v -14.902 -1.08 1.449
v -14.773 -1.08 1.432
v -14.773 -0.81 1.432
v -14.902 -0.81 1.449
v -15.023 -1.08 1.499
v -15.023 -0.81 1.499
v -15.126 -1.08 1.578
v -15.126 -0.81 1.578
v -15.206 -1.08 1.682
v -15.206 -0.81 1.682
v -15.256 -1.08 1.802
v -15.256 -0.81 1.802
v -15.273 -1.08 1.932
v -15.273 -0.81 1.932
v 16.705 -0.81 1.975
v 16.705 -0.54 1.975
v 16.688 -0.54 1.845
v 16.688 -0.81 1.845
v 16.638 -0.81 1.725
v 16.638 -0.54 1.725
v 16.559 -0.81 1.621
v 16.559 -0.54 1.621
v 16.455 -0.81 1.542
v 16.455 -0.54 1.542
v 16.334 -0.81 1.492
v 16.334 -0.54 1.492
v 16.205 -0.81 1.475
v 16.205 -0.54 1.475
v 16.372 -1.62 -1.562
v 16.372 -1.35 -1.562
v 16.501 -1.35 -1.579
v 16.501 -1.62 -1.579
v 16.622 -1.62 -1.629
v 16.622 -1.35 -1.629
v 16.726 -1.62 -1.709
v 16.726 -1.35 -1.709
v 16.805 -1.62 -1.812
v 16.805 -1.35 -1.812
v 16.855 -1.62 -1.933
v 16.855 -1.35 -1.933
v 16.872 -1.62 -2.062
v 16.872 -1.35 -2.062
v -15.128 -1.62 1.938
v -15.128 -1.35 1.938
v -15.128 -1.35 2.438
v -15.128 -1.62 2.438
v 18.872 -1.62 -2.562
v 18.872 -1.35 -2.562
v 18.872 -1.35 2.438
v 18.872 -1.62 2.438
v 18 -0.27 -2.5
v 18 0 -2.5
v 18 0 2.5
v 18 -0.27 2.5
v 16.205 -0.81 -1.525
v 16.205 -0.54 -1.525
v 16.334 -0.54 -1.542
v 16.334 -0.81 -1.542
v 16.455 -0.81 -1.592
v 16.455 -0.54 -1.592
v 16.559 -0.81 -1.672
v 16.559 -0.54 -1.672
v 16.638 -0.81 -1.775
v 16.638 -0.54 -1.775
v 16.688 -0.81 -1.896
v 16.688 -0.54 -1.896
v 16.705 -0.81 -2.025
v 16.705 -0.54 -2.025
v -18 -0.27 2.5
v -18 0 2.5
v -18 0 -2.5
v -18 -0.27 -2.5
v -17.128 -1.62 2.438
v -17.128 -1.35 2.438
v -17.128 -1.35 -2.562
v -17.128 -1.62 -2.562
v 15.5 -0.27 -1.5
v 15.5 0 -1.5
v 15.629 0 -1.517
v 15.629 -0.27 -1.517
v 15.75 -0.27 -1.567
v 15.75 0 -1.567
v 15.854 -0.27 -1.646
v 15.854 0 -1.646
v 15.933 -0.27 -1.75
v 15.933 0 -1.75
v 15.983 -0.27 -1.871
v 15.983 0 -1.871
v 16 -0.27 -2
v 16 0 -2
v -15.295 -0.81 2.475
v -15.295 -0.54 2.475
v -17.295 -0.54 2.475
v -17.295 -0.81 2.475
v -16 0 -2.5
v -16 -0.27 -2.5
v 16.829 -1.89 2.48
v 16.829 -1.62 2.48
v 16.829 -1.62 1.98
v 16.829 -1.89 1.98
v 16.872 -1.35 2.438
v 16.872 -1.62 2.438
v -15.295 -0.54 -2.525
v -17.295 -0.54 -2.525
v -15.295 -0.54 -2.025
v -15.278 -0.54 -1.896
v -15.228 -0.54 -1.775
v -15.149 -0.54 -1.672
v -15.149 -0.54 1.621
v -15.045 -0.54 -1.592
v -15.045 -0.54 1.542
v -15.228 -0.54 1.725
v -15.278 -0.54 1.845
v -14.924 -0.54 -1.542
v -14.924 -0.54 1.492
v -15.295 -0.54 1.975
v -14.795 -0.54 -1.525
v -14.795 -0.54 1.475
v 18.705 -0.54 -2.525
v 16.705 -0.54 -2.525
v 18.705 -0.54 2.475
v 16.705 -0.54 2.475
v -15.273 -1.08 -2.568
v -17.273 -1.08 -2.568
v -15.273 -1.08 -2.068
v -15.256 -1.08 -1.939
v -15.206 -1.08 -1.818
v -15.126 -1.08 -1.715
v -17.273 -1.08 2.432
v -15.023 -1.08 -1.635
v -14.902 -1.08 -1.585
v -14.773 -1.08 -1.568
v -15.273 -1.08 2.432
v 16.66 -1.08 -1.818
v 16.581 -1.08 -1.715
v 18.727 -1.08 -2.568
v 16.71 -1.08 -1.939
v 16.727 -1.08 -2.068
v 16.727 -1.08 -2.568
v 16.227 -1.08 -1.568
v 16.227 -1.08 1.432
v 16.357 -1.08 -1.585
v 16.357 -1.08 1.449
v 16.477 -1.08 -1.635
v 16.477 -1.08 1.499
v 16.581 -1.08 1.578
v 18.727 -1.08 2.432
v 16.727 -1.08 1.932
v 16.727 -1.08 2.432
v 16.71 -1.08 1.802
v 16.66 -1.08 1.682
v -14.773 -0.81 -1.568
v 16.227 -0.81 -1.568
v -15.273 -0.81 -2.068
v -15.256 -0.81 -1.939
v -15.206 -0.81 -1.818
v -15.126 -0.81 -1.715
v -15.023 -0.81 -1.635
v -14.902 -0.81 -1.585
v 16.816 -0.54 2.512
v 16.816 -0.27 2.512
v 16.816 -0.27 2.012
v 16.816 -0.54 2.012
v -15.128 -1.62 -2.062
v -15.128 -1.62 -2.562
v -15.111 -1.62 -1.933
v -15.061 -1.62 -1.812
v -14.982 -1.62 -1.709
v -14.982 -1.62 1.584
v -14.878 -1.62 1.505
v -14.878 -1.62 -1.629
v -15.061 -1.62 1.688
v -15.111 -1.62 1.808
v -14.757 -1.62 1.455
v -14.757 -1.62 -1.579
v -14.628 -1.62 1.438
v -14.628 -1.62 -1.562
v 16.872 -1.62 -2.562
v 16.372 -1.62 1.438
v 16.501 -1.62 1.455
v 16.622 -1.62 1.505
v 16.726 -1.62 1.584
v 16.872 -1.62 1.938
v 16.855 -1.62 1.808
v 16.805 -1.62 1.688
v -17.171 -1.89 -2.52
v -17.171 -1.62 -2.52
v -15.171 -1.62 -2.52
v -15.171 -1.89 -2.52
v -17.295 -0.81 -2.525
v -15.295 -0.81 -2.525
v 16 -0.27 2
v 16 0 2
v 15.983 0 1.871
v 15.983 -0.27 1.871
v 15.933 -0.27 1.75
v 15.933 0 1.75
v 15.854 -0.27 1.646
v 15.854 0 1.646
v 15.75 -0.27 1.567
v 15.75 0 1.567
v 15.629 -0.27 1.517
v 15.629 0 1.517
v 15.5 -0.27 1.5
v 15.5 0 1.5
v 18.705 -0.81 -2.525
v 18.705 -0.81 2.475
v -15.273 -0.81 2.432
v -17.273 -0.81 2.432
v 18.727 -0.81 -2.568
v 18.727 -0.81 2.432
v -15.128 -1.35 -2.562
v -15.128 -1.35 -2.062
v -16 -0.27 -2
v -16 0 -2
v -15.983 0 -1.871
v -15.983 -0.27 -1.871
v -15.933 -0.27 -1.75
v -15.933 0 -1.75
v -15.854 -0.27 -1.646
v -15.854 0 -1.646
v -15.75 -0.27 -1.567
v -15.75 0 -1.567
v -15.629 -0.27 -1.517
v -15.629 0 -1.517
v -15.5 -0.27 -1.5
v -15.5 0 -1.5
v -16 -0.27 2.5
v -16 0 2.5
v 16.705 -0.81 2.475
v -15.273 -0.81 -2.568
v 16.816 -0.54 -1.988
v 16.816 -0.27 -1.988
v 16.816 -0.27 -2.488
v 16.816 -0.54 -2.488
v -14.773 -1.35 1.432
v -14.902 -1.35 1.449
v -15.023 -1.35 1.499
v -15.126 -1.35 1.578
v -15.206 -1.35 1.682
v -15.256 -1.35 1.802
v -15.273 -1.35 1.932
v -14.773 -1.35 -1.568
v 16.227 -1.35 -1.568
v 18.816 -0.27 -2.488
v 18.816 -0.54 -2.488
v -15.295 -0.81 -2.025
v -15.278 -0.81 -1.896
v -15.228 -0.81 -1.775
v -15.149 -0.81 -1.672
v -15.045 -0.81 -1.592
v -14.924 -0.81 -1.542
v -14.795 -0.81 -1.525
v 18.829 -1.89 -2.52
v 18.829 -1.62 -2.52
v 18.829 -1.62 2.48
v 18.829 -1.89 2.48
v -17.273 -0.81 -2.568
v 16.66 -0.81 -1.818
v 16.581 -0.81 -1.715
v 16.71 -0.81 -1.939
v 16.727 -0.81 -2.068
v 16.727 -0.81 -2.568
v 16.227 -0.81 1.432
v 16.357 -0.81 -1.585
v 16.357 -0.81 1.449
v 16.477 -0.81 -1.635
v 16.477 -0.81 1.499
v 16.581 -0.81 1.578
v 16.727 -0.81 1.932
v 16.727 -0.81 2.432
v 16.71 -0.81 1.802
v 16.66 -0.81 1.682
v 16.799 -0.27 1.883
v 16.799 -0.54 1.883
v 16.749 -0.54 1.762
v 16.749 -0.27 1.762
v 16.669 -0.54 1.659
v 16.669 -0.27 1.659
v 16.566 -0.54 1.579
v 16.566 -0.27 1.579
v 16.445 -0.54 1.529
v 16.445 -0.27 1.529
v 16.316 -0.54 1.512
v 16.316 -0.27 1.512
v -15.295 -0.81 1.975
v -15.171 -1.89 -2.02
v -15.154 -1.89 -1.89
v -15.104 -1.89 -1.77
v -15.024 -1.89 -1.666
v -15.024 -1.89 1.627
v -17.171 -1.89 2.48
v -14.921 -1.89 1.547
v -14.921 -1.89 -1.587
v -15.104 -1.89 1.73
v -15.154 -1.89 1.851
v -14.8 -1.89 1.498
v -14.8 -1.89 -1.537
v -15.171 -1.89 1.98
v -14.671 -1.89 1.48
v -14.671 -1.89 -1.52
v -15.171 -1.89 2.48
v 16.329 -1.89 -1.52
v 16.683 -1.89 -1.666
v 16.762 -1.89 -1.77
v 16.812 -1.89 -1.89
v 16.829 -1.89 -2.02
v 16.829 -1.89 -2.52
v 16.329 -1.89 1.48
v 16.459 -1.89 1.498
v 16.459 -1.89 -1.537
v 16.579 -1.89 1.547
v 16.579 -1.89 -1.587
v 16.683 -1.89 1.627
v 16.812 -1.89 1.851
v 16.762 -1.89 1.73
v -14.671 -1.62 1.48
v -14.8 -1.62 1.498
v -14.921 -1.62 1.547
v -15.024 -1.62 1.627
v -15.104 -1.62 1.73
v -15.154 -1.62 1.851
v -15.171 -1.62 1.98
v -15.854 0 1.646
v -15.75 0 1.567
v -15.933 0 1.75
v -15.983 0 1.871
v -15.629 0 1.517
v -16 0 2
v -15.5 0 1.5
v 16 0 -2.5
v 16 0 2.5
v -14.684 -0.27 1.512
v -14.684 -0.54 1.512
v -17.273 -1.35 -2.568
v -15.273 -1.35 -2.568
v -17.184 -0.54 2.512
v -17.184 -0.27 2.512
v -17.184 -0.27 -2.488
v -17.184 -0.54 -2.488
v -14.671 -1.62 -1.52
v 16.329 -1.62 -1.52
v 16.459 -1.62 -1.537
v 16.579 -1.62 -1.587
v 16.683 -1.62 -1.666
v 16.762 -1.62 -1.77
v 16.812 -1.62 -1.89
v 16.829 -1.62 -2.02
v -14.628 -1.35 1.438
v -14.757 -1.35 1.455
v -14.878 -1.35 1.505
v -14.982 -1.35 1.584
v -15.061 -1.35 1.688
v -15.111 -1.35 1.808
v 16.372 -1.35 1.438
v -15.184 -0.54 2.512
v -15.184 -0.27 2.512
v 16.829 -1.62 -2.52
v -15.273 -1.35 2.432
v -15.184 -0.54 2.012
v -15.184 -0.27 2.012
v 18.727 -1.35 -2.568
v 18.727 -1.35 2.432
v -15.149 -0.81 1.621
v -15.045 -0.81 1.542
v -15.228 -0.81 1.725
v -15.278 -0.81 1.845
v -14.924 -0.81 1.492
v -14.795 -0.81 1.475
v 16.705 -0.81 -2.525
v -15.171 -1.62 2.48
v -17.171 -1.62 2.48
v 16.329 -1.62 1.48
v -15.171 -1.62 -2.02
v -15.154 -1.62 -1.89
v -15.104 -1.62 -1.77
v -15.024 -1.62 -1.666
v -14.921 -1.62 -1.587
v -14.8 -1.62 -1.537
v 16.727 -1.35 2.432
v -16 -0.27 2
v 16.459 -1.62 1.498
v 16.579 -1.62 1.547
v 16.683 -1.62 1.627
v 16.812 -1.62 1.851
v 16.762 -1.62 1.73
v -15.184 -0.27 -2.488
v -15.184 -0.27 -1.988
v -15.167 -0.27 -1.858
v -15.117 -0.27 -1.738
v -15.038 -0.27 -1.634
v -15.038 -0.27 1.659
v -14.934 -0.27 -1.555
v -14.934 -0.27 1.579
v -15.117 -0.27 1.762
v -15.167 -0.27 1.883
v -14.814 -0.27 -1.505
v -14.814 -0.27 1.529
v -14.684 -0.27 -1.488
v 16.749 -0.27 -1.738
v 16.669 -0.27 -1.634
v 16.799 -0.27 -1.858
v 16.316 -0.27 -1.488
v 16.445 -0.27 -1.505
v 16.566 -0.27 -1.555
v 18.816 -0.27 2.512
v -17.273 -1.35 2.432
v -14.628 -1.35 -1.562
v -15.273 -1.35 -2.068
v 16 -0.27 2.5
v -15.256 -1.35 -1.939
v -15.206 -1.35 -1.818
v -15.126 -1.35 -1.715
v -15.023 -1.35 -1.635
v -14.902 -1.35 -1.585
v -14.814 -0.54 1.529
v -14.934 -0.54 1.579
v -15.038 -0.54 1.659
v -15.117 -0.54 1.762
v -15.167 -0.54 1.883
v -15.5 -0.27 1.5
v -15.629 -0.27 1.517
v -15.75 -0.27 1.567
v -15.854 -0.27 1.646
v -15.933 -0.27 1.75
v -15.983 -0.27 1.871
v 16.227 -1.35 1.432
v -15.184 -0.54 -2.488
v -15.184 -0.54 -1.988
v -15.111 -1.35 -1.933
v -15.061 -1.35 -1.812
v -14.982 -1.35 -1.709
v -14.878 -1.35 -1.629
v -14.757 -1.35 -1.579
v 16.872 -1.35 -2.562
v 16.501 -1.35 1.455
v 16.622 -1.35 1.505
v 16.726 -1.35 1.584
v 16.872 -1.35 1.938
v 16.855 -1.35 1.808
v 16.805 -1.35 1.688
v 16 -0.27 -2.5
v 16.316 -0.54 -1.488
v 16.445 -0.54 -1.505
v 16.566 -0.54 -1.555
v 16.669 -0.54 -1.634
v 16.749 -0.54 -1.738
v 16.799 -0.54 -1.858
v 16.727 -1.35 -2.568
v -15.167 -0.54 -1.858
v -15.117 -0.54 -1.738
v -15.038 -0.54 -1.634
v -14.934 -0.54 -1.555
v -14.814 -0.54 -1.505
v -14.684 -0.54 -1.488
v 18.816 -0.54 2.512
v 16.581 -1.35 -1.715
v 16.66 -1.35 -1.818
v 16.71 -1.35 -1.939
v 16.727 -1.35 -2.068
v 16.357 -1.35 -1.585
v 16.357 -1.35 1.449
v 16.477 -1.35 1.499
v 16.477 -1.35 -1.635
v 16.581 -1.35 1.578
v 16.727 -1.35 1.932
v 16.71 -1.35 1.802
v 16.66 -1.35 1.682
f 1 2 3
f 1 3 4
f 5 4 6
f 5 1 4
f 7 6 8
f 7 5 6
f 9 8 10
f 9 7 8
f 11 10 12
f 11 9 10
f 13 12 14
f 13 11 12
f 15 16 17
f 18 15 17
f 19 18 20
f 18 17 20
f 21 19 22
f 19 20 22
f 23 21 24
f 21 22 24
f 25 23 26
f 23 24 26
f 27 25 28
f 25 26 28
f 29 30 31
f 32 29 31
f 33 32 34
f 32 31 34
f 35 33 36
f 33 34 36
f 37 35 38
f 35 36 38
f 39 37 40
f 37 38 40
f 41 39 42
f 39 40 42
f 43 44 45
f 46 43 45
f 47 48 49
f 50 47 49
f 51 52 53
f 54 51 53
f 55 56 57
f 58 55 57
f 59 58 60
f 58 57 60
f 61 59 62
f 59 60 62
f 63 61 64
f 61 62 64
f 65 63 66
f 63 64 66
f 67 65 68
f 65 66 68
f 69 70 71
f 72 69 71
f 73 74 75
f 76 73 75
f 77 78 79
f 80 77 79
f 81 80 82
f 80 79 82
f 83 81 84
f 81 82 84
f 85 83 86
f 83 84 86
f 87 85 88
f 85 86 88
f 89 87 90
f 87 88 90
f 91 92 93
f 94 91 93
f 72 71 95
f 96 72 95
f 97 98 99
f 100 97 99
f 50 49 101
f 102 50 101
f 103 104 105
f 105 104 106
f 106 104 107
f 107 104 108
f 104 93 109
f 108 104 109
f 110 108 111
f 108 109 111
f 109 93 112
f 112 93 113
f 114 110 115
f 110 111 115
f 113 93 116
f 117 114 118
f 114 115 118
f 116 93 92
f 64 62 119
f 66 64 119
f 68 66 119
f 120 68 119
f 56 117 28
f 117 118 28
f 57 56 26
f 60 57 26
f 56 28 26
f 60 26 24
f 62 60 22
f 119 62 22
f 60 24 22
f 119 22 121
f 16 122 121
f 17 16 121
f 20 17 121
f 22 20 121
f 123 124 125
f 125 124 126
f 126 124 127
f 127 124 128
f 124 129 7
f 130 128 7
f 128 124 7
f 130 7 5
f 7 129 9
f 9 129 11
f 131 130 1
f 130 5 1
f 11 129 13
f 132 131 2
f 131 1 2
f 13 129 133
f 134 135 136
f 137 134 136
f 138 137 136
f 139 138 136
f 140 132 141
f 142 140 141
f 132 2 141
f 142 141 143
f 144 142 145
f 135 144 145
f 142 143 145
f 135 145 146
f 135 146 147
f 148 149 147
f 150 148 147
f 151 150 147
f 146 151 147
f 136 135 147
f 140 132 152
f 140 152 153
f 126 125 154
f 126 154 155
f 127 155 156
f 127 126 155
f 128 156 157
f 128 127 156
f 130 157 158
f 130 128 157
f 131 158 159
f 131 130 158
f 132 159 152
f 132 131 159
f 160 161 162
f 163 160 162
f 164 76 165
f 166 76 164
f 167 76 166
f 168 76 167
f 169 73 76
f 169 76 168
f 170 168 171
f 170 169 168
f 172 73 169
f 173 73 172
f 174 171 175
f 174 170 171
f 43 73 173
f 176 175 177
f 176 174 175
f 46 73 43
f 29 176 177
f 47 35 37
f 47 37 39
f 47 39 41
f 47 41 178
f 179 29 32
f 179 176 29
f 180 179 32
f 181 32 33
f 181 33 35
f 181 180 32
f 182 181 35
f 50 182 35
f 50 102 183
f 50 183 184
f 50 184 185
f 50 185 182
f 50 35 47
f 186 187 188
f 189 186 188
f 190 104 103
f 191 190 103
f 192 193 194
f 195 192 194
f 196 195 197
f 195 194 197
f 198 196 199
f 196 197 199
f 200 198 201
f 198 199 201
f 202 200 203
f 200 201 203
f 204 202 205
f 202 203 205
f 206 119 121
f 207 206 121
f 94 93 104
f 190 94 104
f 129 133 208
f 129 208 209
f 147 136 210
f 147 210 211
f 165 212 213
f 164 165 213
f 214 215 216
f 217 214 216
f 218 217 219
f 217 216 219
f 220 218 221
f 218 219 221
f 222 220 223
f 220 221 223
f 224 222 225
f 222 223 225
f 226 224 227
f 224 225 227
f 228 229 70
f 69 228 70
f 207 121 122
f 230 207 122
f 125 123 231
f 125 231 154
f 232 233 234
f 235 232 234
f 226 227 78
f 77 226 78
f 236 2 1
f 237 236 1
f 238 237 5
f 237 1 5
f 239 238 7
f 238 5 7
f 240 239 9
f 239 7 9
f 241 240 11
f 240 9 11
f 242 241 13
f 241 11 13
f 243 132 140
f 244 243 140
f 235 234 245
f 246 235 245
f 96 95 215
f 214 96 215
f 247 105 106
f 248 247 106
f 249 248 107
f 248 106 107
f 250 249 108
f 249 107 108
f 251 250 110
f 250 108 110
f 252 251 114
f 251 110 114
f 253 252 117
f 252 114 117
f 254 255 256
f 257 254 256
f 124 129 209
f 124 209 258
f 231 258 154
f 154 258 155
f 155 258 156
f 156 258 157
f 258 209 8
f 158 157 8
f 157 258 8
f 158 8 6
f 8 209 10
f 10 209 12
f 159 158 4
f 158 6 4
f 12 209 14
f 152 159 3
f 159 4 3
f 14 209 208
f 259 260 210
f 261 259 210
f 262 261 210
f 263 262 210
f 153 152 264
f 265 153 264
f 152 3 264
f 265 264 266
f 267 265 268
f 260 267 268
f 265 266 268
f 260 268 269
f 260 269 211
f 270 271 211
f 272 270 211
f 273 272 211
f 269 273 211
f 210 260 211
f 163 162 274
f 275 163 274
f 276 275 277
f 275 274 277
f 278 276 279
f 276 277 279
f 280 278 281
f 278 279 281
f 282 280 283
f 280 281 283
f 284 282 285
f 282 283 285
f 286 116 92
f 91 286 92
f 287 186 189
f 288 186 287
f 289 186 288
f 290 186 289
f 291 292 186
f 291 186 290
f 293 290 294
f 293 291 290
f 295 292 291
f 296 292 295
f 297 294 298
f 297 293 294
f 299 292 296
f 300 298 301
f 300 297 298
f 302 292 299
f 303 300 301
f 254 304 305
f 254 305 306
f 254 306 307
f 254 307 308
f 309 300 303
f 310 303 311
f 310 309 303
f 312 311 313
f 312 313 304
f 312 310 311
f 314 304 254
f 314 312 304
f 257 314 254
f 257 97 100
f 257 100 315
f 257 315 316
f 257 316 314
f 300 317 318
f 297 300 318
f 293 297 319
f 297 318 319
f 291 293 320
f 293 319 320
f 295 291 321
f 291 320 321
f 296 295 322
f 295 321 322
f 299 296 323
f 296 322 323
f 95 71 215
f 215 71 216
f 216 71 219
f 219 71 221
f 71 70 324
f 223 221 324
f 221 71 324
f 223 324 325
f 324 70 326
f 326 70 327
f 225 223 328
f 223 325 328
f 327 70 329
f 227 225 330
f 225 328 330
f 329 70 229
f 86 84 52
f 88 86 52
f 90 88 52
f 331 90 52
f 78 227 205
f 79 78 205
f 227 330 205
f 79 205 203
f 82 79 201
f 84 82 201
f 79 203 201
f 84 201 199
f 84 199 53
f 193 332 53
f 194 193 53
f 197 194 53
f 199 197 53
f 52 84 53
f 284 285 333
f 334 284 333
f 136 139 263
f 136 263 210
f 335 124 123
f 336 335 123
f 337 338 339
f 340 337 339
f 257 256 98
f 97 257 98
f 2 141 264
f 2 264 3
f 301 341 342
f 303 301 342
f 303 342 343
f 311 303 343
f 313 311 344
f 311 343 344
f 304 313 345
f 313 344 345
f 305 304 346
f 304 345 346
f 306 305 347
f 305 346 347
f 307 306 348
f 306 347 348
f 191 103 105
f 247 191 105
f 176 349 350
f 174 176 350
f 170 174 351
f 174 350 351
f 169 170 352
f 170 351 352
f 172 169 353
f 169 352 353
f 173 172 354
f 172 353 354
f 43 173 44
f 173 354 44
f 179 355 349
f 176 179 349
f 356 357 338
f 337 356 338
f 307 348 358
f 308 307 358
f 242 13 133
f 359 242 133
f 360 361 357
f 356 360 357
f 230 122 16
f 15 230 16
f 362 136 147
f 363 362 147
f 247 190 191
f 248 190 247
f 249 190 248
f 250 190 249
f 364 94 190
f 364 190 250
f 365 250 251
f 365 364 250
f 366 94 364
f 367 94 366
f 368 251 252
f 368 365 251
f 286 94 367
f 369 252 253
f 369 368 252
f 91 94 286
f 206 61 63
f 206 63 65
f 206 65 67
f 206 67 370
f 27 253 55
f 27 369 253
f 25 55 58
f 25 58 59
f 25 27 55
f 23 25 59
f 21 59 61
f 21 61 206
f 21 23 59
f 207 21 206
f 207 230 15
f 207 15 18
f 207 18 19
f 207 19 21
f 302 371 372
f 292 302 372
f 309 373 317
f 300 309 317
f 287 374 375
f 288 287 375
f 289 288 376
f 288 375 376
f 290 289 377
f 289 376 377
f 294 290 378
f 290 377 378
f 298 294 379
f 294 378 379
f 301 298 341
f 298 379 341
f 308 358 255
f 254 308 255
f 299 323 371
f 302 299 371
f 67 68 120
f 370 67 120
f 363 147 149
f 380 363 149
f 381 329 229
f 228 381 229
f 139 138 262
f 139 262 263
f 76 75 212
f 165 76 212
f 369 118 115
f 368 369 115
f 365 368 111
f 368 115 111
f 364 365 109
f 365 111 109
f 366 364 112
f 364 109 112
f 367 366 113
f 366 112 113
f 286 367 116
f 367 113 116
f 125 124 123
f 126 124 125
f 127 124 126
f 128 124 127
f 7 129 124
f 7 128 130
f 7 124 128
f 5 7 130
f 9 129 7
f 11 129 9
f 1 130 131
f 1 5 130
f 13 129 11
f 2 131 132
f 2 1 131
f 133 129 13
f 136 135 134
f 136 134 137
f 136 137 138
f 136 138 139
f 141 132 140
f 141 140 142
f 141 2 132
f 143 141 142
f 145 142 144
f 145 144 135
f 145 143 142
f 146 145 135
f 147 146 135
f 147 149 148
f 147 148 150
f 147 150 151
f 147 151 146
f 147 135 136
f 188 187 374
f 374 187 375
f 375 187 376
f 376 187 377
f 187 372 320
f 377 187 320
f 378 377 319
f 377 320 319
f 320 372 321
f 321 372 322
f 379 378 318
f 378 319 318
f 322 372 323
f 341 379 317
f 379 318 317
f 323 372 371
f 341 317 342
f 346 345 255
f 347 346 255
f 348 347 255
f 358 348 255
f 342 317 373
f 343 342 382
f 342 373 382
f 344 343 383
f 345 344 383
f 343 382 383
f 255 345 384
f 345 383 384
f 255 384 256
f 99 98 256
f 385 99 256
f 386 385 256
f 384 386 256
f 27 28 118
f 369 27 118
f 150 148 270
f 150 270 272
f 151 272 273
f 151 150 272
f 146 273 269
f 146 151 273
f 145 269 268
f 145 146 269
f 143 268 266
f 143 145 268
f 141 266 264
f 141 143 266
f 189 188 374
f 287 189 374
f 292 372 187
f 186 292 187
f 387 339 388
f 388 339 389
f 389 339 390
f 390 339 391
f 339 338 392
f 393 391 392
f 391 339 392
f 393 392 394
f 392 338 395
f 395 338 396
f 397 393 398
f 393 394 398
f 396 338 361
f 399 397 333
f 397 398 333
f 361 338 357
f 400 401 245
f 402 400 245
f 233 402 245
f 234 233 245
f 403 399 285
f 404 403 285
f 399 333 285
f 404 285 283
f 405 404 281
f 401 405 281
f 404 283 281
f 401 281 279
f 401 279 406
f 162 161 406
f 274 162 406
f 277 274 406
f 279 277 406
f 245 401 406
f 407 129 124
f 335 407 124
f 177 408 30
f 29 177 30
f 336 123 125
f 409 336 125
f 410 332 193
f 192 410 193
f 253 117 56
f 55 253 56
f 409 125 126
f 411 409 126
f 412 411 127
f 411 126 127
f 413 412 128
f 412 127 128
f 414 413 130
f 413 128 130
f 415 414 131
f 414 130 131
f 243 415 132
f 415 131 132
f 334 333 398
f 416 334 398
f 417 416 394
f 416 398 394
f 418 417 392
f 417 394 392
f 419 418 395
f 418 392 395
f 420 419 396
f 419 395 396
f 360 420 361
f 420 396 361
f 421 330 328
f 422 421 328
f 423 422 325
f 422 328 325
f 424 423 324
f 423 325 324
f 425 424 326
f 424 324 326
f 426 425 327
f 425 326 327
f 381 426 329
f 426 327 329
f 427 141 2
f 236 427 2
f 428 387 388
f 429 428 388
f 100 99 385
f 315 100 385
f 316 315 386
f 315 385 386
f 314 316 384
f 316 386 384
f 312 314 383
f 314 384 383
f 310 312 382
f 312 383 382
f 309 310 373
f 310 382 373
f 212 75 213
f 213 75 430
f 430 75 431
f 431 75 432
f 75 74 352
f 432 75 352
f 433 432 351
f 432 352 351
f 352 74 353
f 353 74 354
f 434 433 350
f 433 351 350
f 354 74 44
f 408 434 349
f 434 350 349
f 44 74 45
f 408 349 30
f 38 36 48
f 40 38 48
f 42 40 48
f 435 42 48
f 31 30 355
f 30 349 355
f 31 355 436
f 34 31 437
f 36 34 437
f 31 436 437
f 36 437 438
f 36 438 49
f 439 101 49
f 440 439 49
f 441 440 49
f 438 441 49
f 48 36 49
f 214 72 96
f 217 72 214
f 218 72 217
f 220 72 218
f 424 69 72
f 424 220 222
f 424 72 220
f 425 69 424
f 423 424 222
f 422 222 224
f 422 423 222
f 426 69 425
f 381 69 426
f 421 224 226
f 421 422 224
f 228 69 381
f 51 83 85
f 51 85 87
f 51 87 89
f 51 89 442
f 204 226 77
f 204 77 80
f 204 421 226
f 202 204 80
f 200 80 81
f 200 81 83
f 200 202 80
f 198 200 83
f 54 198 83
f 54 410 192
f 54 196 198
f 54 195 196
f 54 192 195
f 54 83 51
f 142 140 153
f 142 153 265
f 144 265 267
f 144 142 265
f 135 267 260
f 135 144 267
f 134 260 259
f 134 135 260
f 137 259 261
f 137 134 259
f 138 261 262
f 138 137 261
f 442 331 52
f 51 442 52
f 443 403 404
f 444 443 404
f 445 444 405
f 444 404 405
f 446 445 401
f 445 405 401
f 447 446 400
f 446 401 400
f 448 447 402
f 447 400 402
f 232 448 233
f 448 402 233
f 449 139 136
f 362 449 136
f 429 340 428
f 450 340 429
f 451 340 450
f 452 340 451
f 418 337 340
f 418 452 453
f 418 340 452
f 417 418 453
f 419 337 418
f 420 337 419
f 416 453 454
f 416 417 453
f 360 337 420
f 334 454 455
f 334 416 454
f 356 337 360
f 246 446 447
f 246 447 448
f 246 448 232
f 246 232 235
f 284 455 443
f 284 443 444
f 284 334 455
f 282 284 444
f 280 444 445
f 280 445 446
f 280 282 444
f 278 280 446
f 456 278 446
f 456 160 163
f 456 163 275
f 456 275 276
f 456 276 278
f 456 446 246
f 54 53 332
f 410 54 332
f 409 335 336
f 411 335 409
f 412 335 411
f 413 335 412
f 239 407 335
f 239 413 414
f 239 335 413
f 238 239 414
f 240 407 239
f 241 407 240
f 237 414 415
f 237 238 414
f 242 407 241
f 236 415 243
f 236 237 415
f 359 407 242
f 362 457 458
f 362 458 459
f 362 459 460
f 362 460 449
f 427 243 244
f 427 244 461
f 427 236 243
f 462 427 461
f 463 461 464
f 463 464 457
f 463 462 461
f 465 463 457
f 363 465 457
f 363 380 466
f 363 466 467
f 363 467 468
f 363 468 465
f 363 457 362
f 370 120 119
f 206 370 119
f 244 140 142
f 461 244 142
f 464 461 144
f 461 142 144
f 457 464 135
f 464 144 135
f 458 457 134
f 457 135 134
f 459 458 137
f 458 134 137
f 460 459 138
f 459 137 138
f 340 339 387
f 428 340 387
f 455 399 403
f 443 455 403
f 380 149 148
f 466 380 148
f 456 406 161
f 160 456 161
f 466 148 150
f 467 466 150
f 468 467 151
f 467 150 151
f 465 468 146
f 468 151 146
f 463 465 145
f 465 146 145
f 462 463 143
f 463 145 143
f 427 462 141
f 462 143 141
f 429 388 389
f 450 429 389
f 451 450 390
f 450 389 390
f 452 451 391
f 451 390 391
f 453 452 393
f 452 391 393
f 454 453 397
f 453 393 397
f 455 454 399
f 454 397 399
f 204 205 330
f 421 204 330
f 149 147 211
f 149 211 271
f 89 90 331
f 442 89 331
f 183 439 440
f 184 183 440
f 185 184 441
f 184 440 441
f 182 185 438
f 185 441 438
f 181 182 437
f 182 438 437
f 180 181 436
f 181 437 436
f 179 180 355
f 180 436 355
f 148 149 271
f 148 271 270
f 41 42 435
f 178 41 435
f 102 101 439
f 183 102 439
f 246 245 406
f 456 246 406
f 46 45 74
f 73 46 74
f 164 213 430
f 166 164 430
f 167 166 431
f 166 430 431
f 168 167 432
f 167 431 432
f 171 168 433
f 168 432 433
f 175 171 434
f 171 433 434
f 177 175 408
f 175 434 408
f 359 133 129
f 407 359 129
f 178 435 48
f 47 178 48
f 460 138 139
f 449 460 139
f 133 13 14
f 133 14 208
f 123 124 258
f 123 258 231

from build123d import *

# Parameters (mm, degrees)
F1_DEPTH  = 0.27
F4_DEPTH  = 0.27
F7_DEPTH  = 0.27
F10_DEPTH = 0.27
F13_DEPTH = 0.27
F14_DEPTH = 0.27
F15_DEPTH = 0.27
F18_DEPTH = 0.27
F21_DEPTH = 0.27


with BuildPart() as f1:
    # F0 (on Front) → F1 (new body)
    with BuildSketch(Plane.XZ):
        with BuildLine():
            Line((-16, 2.5), (-18, 2.5))
            Line((-18, 2.5), (-18, 0))
            Line((-18, 0), (18, 0))
            Line((18, 0), (18, 2.5))
            Line((18, 2.5), (16, 2.5))
            Line((16, 2.5), (16, 2))
            ThreePointArc((16, 2), (15.8535533906, 1.6464466094), (15.5, 1.5))
            Line((15.5, 1.5), (0, 1.5))
            Line((0, 1.5), (-15.5, 1.5))
            ThreePointArc((-15.5, 1.5), (-15.8535533906, 1.6464466094), (-16, 2))
            Line((-16, 2), (-16, 2.5))
        make_face()
        with BuildLine():
            Line((18, 0), (-18, 0))
            Line((-18, 0), (-18, -2.5))
            Line((-18, -2.5), (-16, -2.5))
            Line((-16, -2.5), (-16, -2))
            ThreePointArc((-16, -2), (-15.8535533906, -1.6464466094), (-15.5, -1.5))
            Line((-15.5, -1.5), (0, -1.5))
            Line((0, -1.5), (15.5, -1.5))
            ThreePointArc((15.5, -1.5), (15.8535533906, -1.6464466094), (16, -2))
            Line((16, -2), (16, -2.5))
            Line((16, -2.5), (18, -2.5))
            Line((18, -2.5), (18, 0))
        make_face()
    extrude(amount=F1_DEPTH)

    # F3 (on offset) → F4 (cut)
    with BuildSketch(Plane.XZ.offset(0.27)):
        with BuildLine():
            Line((-15.1841846166, 2.5122108632), (-17.1841846166, 2.5122108632))
            Line((-17.1841846166, 2.5122108632), (-17.1841846166, 0.0122108632))
            Line((-17.1841846166, 0.0122108632), (18.8158153834, 0.0122108632))
            Line((18.8158153834, 0.0122108632), (18.8158153834, 2.5122108632))
            Line((18.8158153834, 2.5122108632), (16.8158153834, 2.5122108632))
            Line((16.8158153834, 2.5122108632), (16.8158153834, 2.0122108632))
            ThreePointArc((16.8158153834, 2.0122108632), (16.669368774, 1.6586574726), (16.3158153834, 1.5122108632))
            Line((16.3158153834, 1.5122108632), (0.8158153834, 1.5122108632))
            Line((0.8158153834, 1.5122108632), (-14.6841846166, 1.5122108632))
            ThreePointArc((-14.6841846166, 1.5122108632), (-15.0377380072, 1.6586574726), (-15.1841846166, 2.0122108632))
            Line((-15.1841846166, 2.0122108632), (-15.1841846166, 2.5122108632))
        make_face()
        with BuildLine():
            Line((18.8158153834, 0.0122108632), (-17.1841846166, 0.0122108632))
            Line((-17.1841846166, 0.0122108632), (-17.1841846166, -2.4877891368))
            Line((-17.1841846166, -2.4877891368), (-15.1841846166, -2.4877891368))
            Line((-15.1841846166, -2.4877891368), (-15.1841846166, -1.9877891368))
            ThreePointArc((-15.1841846166, -1.9877891368), (-15.0377380072, -1.6342357462), (-14.6841846166, -1.4877891368))
            Line((-14.6841846166, -1.4877891368), (0.8158153834, -1.4877891368))
            Line((0.8158153834, -1.4877891368), (16.3158153834, -1.4877891368))
            ThreePointArc((16.3158153834, -1.4877891368), (16.669368774, -1.6342357462), (16.8158153834, -1.9877891368))
            Line((16.8158153834, -1.9877891368), (16.8158153834, -2.4877891368))
            Line((16.8158153834, -2.4877891368), (18.8158153834, -2.4877891368))
            Line((18.8158153834, -2.4877891368), (18.8158153834, 0.0122108632))
        make_face()
    extrude(amount=F4_DEPTH, mode=Mode.SUBTRACT)

    # F9 (on offset) → F10 (cut)
    with BuildSketch(Plane.XZ.offset(0.81)):
        with BuildLine():
            Line((-15.2458471914, 2.4499582283), (-17.2458471914, 2.4499582283))
            Line((-17.2458471914, 2.4499582283), (-17.2458471914, -0.0500417717))
            Line((-17.2458471914, -0.0500417717), (18.7541528086, -0.0500417717))
            Line((18.7541528086, -0.0500417717), (18.7541528086, 2.4499582283))
            Line((18.7541528086, 2.4499582283), (16.7541528086, 2.4499582283))
            Line((16.7541528086, 2.4499582283), (16.7541528086, 1.9499582283))
            ThreePointArc((16.7541528086, 1.9499582283), (16.6077061992, 1.5964048377), (16.2541528086, 1.4499582283))
            Line((16.2541528086, 1.4499582283), (0.7541528086, 1.4499582283))
            Line((0.7541528086, 1.4499582283), (-14.7458471914, 1.4499582283))
            ThreePointArc((-14.7458471914, 1.4499582283), (-15.099400582, 1.5964048377), (-15.2458471914, 1.9499582283))
            Line((-15.2458471914, 1.9499582283), (-15.2458471914, 2.4499582283))
        make_face()
        with BuildLine():
            Line((18.7541528086, -0.0500417717), (-17.2458471914, -0.0500417717))
            Line((-17.2458471914, -0.0500417717), (-17.2458471914, -2.5500417717))
            Line((-17.2458471914, -2.5500417717), (-15.2458471914, -2.5500417717))
            Line((-15.2458471914, -2.5500417717), (-15.2458471914, -2.0500417717))
            ThreePointArc((-15.2458471914, -2.0500417717), (-15.099400582, -1.6964883811), (-14.7458471914, -1.5500417717))
            Line((-14.7458471914, -1.5500417717), (0.7541528086, -1.5500417717))
            Line((0.7541528086, -1.5500417717), (16.2541528086, -1.5500417717))
            ThreePointArc((16.2541528086, -1.5500417717), (16.6077061992, -1.6964883811), (16.7541528086, -2.0500417717))
            Line((16.7541528086, -2.0500417717), (16.7541528086, -2.5500417717))
            Line((16.7541528086, -2.5500417717), (18.7541528086, -2.5500417717))
            Line((18.7541528086, -2.5500417717), (18.7541528086, -0.0500417717))
        make_face()
    extrude(amount=F10_DEPTH, mode=Mode.SUBTRACT)


with BuildPart() as f7:
    # F6 (on offset) → F7 (new body)
    with BuildSketch(Plane.XZ.offset(0.54)):
        with BuildLine():
            Line((-15.2949587338, 2.4747978128), (-17.2949587338, 2.4747978128))
            Line((-17.2949587338, 2.4747978128), (-17.2949587338, -0.0252021872))
            Line((-17.2949587338, -0.0252021872), (18.7050412662, -0.0252021872))
            Line((18.7050412662, -0.0252021872), (18.7050412662, 2.4747978128))
            Line((18.7050412662, 2.4747978128), (16.7050412662, 2.4747978128))
            Line((16.7050412662, 2.4747978128), (16.7050412662, 1.9747978128))
            ThreePointArc((16.7050412662, 1.9747978128), (16.5585946567, 1.6212444222), (16.2050412662, 1.4747978128))
            Line((16.2050412662, 1.4747978128), (0.7050412662, 1.4747978128))
            Line((0.7050412662, 1.4747978128), (-14.7949587338, 1.4747978128))
            ThreePointArc((-14.7949587338, 1.4747978128), (-15.1485121244, 1.6212444222), (-15.2949587338, 1.9747978128))
            Line((-15.2949587338, 1.9747978128), (-15.2949587338, 2.4747978128))
        make_face()
        with BuildLine():
            Line((18.7050412662, -0.0252021872), (-17.2949587338, -0.0252021872))
            Line((-17.2949587338, -0.0252021872), (-17.2949587338, -2.5252021872))
            Line((-17.2949587338, -2.5252021872), (-15.2949587338, -2.5252021872))
            Line((-15.2949587338, -2.5252021872), (-15.2949587338, -2.0252021872))
            ThreePointArc((-15.2949587338, -2.0252021872), (-15.1485121244, -1.6716487966), (-14.7949587338, -1.5252021872))
            Line((-14.7949587338, -1.5252021872), (0.7050412662, -1.5252021872))
            Line((0.7050412662, -1.5252021872), (16.2050412662, -1.5252021872))
            ThreePointArc((16.2050412662, -1.5252021872), (16.5585946567, -1.6716487966), (16.7050412662, -2.0252021872))
            Line((16.7050412662, -2.0252021872), (16.7050412662, -2.5252021872))
            Line((16.7050412662, -2.5252021872), (18.7050412662, -2.5252021872))
            Line((18.7050412662, -2.5252021872), (18.7050412662, -0.0252021872))
        make_face()
    extrude(amount=F7_DEPTH)


with BuildPart() as f13:
    # F12 (on offset) → F13 (new body)
    with BuildSketch(Plane.XZ.offset(1.08)):
        with BuildLine():
            Line((-15.2727272727, 2.4318181818), (-17.2727272727, 2.4318181818))
            Line((-17.2727272727, 2.4318181818), (-17.2727272727, -0.0681818182))
            Line((-17.2727272727, -0.0681818182), (18.7272727273, -0.0681818182))
            Line((18.7272727273, -0.0681818182), (18.7272727273, 2.4318181818))
            Line((18.7272727273, 2.4318181818), (16.7272727273, 2.4318181818))
            Line((16.7272727273, 2.4318181818), (16.7272727273, 1.9318181818))
            ThreePointArc((16.7272727273, 1.9318181818), (16.5808261179, 1.5782647912), (16.2272727273, 1.4318181818))
            Line((16.2272727273, 1.4318181818), (0.7272727273, 1.4318181818))
            Line((0.7272727273, 1.4318181818), (-14.7727272727, 1.4318181818))
            ThreePointArc((-14.7727272727, 1.4318181818), (-15.1262806633, 1.5782647912), (-15.2727272727, 1.9318181818))
            Line((-15.2727272727, 1.9318181818), (-15.2727272727, 2.4318181818))
        make_face()
        with BuildLine():
            Line((18.7272727273, -0.0681818182), (-17.2727272727, -0.0681818182))
            Line((-17.2727272727, -0.0681818182), (-17.2727272727, -2.5681818182))
            Line((-17.2727272727, -2.5681818182), (-15.2727272727, -2.5681818182))
            Line((-15.2727272727, -2.5681818182), (-15.2727272727, -2.0681818182))
            ThreePointArc((-15.2727272727, -2.0681818182), (-15.1262806633, -1.7146284276), (-14.7727272727, -1.5681818182))
            Line((-14.7727272727, -1.5681818182), (0.7272727273, -1.5681818182))
            Line((0.7272727273, -1.5681818182), (16.2272727273, -1.5681818182))
            ThreePointArc((16.2272727273, -1.5681818182), (16.5808261179, -1.7146284276), (16.7272727273, -2.0681818182))
            Line((16.7272727273, -2.0681818182), (16.7272727273, -2.5681818182))
            Line((16.7272727273, -2.5681818182), (18.7272727273, -2.5681818182))
            Line((18.7272727273, -2.5681818182), (18.7272727273, -0.0681818182))
        make_face()
    extrude(amount=F13_DEPTH)


with BuildPart() as f14:
    # F3 (on offset) → F14 (new body)
    with BuildSketch(Plane.XZ.offset(0.27)):
        with BuildLine():
            Line((-15.1841846166, 2.5122108632), (-17.1841846166, 2.5122108632))
            Line((-17.1841846166, 2.5122108632), (-17.1841846166, 0.0122108632))
            Line((-17.1841846166, 0.0122108632), (18.8158153834, 0.0122108632))
            Line((18.8158153834, 0.0122108632), (18.8158153834, 2.5122108632))
            Line((18.8158153834, 2.5122108632), (16.8158153834, 2.5122108632))
            Line((16.8158153834, 2.5122108632), (16.8158153834, 2.0122108632))
            ThreePointArc((16.8158153834, 2.0122108632), (16.669368774, 1.6586574726), (16.3158153834, 1.5122108632))
            Line((16.3158153834, 1.5122108632), (0.8158153834, 1.5122108632))
            Line((0.8158153834, 1.5122108632), (-14.6841846166, 1.5122108632))
            ThreePointArc((-14.6841846166, 1.5122108632), (-15.0377380072, 1.6586574726), (-15.1841846166, 2.0122108632))
            Line((-15.1841846166, 2.0122108632), (-15.1841846166, 2.5122108632))
        make_face()
        with BuildLine():
            Line((18.8158153834, 0.0122108632), (-17.1841846166, 0.0122108632))
            Line((-17.1841846166, 0.0122108632), (-17.1841846166, -2.4877891368))
            Line((-17.1841846166, -2.4877891368), (-15.1841846166, -2.4877891368))
            Line((-15.1841846166, -2.4877891368), (-15.1841846166, -1.9877891368))
            ThreePointArc((-15.1841846166, -1.9877891368), (-15.0377380072, -1.6342357462), (-14.6841846166, -1.4877891368))
            Line((-14.6841846166, -1.4877891368), (0.8158153834, -1.4877891368))
            Line((0.8158153834, -1.4877891368), (16.3158153834, -1.4877891368))
            ThreePointArc((16.3158153834, -1.4877891368), (16.669368774, -1.6342357462), (16.8158153834, -1.9877891368))
            Line((16.8158153834, -1.9877891368), (16.8158153834, -2.4877891368))
            Line((16.8158153834, -2.4877891368), (18.8158153834, -2.4877891368))
            Line((18.8158153834, -2.4877891368), (18.8158153834, 0.0122108632))
        make_face()
    extrude(amount=F14_DEPTH)


with BuildPart() as f15:
    # F12 (on offset) → F15 (new body)
    with BuildSketch(Plane.XZ.offset(1.08)):
        with BuildLine():
            Line((-15.2727272727, 2.4318181818), (-17.2727272727, 2.4318181818))
            Line((-17.2727272727, 2.4318181818), (-17.2727272727, -0.0681818182))
            Line((-17.2727272727, -0.0681818182), (18.7272727273, -0.0681818182))
            Line((18.7272727273, -0.0681818182), (18.7272727273, 2.4318181818))
            Line((18.7272727273, 2.4318181818), (16.7272727273, 2.4318181818))
            Line((16.7272727273, 2.4318181818), (16.7272727273, 1.9318181818))
            ThreePointArc((16.7272727273, 1.9318181818), (16.5808261179, 1.5782647912), (16.2272727273, 1.4318181818))
            Line((16.2272727273, 1.4318181818), (0.7272727273, 1.4318181818))
            Line((0.7272727273, 1.4318181818), (-14.7727272727, 1.4318181818))
            ThreePointArc((-14.7727272727, 1.4318181818), (-15.1262806633, 1.5782647912), (-15.2727272727, 1.9318181818))
            Line((-15.2727272727, 1.9318181818), (-15.2727272727, 2.4318181818))
        make_face()
        with BuildLine():
            Line((18.7272727273, -0.0681818182), (-17.2727272727, -0.0681818182))
            Line((-17.2727272727, -0.0681818182), (-17.2727272727, -2.5681818182))
            Line((-17.2727272727, -2.5681818182), (-15.2727272727, -2.5681818182))
            Line((-15.2727272727, -2.5681818182), (-15.2727272727, -2.0681818182))
            ThreePointArc((-15.2727272727, -2.0681818182), (-15.1262806633, -1.7146284276), (-14.7727272727, -1.5681818182))
            Line((-14.7727272727, -1.5681818182), (0.7272727273, -1.5681818182))
            Line((0.7272727273, -1.5681818182), (16.2272727273, -1.5681818182))
            ThreePointArc((16.2272727273, -1.5681818182), (16.5808261179, -1.7146284276), (16.7272727273, -2.0681818182))
            Line((16.7272727273, -2.0681818182), (16.7272727273, -2.5681818182))
            Line((16.7272727273, -2.5681818182), (18.7272727273, -2.5681818182))
            Line((18.7272727273, -2.5681818182), (18.7272727273, -0.0681818182))
        make_face()
    extrude(amount=-F15_DEPTH)


with BuildPart() as f18:
    # F17 (on offset) → F18 (new body)
    with BuildSketch(Plane.XZ.offset(1.35)):
        with BuildLine():
            Line((-15.1280487846, 2.4376975121), (-17.1280487846, 2.4376975121))
            Line((-17.1280487846, 2.4376975121), (-17.1280487846, -0.0623024879))
            Line((-17.1280487846, -0.0623024879), (18.8719512154, -0.0623024879))
            Line((18.8719512154, -0.0623024879), (18.8719512154, 2.4376975121))
            Line((18.8719512154, 2.4376975121), (16.8719512154, 2.4376975121))
            Line((16.8719512154, 2.4376975121), (16.8719512154, 1.9376975121))
            ThreePointArc((16.8719512154, 1.9376975121), (16.725504606, 1.5841441215), (16.3719512154, 1.4376975121))
            Line((16.3719512154, 1.4376975121), (0.8719512154, 1.4376975121))
            Line((0.8719512154, 1.4376975121), (-14.6280487846, 1.4376975121))
            ThreePointArc((-14.6280487846, 1.4376975121), (-14.9816021752, 1.5841441215), (-15.1280487846, 1.9376975121))
            Line((-15.1280487846, 1.9376975121), (-15.1280487846, 2.4376975121))
        make_face()
        with BuildLine():
            Line((18.8719512154, -0.0623024879), (-17.1280487846, -0.0623024879))
            Line((-17.1280487846, -0.0623024879), (-17.1280487846, -2.5623024879))
            Line((-17.1280487846, -2.5623024879), (-15.1280487846, -2.5623024879))
            Line((-15.1280487846, -2.5623024879), (-15.1280487846, -2.0623024879))
            ThreePointArc((-15.1280487846, -2.0623024879), (-14.9816021752, -1.7087490973), (-14.6280487846, -1.5623024879))
            Line((-14.6280487846, -1.5623024879), (0.8719512154, -1.5623024879))
            Line((0.8719512154, -1.5623024879), (16.3719512154, -1.5623024879))
            ThreePointArc((16.3719512154, -1.5623024879), (16.725504606, -1.7087490973), (16.8719512154, -2.0623024879))
            Line((16.8719512154, -2.0623024879), (16.8719512154, -2.5623024879))
            Line((16.8719512154, -2.5623024879), (18.8719512154, -2.5623024879))
            Line((18.8719512154, -2.5623024879), (18.8719512154, -0.0623024879))
        make_face()
    extrude(amount=F18_DEPTH)


with BuildPart() as f21:
    # F20 (on offset) → F21 (new body)
    with BuildSketch(Plane.XZ.offset(1.62)):
        with BuildLine():
            Line((-15.1708155028, 2.4804651617), (-17.1708155028, 2.4804651617))
            Line((-17.1708155028, 2.4804651617), (-17.1708155028, -0.0195348383))
            Line((-17.1708155028, -0.0195348383), (18.8291844972, -0.0195348383))
            Line((18.8291844972, -0.0195348383), (18.8291844972, 2.4804651617))
            Line((18.8291844972, 2.4804651617), (16.8291844972, 2.4804651617))
            Line((16.8291844972, 2.4804651617), (16.8291844972, 1.9804651617))
            ThreePointArc((16.8291844972, 1.9804651617), (16.6827378878, 1.6269117711), (16.3291844972, 1.4804651617))
            Line((16.3291844972, 1.4804651617), (0.8291844972, 1.4804651617))
            Line((0.8291844972, 1.4804651617), (-14.6708155028, 1.4804651617))
            ThreePointArc((-14.6708155028, 1.4804651617), (-15.0243688934, 1.6269117711), (-15.1708155028, 1.9804651617))
            Line((-15.1708155028, 1.9804651617), (-15.1708155028, 2.4804651617))
        make_face()
        with BuildLine():
            Line((18.8291844972, -0.0195348383), (-17.1708155028, -0.0195348383))
            Line((-17.1708155028, -0.0195348383), (-17.1708155028, -2.5195348383))
            Line((-17.1708155028, -2.5195348383), (-15.1708155028, -2.5195348383))
            Line((-15.1708155028, -2.5195348383), (-15.1708155028, -2.0195348383))
            ThreePointArc((-15.1708155028, -2.0195348383), (-15.0243688934, -1.6659814477), (-14.6708155028, -1.5195348383))
            Line((-14.6708155028, -1.5195348383), (0.8291844972, -1.5195348383))
            Line((0.8291844972, -1.5195348383), (16.3291844972, -1.5195348383))
            ThreePointArc((16.3291844972, -1.5195348383), (16.6827378878, -1.6659814477), (16.8291844972, -2.0195348383))
            Line((16.8291844972, -2.0195348383), (16.8291844972, -2.5195348383))
            Line((16.8291844972, -2.5195348383), (18.8291844972, -2.5195348383))
            Line((18.8291844972, -2.5195348383), (18.8291844972, -0.0195348383))
        make_face()
    extrude(amount=F21_DEPTH)


solid = Compound([f1.part, f7.part, f13.part, f14.part, f15.part, f18.part, f21.part])
